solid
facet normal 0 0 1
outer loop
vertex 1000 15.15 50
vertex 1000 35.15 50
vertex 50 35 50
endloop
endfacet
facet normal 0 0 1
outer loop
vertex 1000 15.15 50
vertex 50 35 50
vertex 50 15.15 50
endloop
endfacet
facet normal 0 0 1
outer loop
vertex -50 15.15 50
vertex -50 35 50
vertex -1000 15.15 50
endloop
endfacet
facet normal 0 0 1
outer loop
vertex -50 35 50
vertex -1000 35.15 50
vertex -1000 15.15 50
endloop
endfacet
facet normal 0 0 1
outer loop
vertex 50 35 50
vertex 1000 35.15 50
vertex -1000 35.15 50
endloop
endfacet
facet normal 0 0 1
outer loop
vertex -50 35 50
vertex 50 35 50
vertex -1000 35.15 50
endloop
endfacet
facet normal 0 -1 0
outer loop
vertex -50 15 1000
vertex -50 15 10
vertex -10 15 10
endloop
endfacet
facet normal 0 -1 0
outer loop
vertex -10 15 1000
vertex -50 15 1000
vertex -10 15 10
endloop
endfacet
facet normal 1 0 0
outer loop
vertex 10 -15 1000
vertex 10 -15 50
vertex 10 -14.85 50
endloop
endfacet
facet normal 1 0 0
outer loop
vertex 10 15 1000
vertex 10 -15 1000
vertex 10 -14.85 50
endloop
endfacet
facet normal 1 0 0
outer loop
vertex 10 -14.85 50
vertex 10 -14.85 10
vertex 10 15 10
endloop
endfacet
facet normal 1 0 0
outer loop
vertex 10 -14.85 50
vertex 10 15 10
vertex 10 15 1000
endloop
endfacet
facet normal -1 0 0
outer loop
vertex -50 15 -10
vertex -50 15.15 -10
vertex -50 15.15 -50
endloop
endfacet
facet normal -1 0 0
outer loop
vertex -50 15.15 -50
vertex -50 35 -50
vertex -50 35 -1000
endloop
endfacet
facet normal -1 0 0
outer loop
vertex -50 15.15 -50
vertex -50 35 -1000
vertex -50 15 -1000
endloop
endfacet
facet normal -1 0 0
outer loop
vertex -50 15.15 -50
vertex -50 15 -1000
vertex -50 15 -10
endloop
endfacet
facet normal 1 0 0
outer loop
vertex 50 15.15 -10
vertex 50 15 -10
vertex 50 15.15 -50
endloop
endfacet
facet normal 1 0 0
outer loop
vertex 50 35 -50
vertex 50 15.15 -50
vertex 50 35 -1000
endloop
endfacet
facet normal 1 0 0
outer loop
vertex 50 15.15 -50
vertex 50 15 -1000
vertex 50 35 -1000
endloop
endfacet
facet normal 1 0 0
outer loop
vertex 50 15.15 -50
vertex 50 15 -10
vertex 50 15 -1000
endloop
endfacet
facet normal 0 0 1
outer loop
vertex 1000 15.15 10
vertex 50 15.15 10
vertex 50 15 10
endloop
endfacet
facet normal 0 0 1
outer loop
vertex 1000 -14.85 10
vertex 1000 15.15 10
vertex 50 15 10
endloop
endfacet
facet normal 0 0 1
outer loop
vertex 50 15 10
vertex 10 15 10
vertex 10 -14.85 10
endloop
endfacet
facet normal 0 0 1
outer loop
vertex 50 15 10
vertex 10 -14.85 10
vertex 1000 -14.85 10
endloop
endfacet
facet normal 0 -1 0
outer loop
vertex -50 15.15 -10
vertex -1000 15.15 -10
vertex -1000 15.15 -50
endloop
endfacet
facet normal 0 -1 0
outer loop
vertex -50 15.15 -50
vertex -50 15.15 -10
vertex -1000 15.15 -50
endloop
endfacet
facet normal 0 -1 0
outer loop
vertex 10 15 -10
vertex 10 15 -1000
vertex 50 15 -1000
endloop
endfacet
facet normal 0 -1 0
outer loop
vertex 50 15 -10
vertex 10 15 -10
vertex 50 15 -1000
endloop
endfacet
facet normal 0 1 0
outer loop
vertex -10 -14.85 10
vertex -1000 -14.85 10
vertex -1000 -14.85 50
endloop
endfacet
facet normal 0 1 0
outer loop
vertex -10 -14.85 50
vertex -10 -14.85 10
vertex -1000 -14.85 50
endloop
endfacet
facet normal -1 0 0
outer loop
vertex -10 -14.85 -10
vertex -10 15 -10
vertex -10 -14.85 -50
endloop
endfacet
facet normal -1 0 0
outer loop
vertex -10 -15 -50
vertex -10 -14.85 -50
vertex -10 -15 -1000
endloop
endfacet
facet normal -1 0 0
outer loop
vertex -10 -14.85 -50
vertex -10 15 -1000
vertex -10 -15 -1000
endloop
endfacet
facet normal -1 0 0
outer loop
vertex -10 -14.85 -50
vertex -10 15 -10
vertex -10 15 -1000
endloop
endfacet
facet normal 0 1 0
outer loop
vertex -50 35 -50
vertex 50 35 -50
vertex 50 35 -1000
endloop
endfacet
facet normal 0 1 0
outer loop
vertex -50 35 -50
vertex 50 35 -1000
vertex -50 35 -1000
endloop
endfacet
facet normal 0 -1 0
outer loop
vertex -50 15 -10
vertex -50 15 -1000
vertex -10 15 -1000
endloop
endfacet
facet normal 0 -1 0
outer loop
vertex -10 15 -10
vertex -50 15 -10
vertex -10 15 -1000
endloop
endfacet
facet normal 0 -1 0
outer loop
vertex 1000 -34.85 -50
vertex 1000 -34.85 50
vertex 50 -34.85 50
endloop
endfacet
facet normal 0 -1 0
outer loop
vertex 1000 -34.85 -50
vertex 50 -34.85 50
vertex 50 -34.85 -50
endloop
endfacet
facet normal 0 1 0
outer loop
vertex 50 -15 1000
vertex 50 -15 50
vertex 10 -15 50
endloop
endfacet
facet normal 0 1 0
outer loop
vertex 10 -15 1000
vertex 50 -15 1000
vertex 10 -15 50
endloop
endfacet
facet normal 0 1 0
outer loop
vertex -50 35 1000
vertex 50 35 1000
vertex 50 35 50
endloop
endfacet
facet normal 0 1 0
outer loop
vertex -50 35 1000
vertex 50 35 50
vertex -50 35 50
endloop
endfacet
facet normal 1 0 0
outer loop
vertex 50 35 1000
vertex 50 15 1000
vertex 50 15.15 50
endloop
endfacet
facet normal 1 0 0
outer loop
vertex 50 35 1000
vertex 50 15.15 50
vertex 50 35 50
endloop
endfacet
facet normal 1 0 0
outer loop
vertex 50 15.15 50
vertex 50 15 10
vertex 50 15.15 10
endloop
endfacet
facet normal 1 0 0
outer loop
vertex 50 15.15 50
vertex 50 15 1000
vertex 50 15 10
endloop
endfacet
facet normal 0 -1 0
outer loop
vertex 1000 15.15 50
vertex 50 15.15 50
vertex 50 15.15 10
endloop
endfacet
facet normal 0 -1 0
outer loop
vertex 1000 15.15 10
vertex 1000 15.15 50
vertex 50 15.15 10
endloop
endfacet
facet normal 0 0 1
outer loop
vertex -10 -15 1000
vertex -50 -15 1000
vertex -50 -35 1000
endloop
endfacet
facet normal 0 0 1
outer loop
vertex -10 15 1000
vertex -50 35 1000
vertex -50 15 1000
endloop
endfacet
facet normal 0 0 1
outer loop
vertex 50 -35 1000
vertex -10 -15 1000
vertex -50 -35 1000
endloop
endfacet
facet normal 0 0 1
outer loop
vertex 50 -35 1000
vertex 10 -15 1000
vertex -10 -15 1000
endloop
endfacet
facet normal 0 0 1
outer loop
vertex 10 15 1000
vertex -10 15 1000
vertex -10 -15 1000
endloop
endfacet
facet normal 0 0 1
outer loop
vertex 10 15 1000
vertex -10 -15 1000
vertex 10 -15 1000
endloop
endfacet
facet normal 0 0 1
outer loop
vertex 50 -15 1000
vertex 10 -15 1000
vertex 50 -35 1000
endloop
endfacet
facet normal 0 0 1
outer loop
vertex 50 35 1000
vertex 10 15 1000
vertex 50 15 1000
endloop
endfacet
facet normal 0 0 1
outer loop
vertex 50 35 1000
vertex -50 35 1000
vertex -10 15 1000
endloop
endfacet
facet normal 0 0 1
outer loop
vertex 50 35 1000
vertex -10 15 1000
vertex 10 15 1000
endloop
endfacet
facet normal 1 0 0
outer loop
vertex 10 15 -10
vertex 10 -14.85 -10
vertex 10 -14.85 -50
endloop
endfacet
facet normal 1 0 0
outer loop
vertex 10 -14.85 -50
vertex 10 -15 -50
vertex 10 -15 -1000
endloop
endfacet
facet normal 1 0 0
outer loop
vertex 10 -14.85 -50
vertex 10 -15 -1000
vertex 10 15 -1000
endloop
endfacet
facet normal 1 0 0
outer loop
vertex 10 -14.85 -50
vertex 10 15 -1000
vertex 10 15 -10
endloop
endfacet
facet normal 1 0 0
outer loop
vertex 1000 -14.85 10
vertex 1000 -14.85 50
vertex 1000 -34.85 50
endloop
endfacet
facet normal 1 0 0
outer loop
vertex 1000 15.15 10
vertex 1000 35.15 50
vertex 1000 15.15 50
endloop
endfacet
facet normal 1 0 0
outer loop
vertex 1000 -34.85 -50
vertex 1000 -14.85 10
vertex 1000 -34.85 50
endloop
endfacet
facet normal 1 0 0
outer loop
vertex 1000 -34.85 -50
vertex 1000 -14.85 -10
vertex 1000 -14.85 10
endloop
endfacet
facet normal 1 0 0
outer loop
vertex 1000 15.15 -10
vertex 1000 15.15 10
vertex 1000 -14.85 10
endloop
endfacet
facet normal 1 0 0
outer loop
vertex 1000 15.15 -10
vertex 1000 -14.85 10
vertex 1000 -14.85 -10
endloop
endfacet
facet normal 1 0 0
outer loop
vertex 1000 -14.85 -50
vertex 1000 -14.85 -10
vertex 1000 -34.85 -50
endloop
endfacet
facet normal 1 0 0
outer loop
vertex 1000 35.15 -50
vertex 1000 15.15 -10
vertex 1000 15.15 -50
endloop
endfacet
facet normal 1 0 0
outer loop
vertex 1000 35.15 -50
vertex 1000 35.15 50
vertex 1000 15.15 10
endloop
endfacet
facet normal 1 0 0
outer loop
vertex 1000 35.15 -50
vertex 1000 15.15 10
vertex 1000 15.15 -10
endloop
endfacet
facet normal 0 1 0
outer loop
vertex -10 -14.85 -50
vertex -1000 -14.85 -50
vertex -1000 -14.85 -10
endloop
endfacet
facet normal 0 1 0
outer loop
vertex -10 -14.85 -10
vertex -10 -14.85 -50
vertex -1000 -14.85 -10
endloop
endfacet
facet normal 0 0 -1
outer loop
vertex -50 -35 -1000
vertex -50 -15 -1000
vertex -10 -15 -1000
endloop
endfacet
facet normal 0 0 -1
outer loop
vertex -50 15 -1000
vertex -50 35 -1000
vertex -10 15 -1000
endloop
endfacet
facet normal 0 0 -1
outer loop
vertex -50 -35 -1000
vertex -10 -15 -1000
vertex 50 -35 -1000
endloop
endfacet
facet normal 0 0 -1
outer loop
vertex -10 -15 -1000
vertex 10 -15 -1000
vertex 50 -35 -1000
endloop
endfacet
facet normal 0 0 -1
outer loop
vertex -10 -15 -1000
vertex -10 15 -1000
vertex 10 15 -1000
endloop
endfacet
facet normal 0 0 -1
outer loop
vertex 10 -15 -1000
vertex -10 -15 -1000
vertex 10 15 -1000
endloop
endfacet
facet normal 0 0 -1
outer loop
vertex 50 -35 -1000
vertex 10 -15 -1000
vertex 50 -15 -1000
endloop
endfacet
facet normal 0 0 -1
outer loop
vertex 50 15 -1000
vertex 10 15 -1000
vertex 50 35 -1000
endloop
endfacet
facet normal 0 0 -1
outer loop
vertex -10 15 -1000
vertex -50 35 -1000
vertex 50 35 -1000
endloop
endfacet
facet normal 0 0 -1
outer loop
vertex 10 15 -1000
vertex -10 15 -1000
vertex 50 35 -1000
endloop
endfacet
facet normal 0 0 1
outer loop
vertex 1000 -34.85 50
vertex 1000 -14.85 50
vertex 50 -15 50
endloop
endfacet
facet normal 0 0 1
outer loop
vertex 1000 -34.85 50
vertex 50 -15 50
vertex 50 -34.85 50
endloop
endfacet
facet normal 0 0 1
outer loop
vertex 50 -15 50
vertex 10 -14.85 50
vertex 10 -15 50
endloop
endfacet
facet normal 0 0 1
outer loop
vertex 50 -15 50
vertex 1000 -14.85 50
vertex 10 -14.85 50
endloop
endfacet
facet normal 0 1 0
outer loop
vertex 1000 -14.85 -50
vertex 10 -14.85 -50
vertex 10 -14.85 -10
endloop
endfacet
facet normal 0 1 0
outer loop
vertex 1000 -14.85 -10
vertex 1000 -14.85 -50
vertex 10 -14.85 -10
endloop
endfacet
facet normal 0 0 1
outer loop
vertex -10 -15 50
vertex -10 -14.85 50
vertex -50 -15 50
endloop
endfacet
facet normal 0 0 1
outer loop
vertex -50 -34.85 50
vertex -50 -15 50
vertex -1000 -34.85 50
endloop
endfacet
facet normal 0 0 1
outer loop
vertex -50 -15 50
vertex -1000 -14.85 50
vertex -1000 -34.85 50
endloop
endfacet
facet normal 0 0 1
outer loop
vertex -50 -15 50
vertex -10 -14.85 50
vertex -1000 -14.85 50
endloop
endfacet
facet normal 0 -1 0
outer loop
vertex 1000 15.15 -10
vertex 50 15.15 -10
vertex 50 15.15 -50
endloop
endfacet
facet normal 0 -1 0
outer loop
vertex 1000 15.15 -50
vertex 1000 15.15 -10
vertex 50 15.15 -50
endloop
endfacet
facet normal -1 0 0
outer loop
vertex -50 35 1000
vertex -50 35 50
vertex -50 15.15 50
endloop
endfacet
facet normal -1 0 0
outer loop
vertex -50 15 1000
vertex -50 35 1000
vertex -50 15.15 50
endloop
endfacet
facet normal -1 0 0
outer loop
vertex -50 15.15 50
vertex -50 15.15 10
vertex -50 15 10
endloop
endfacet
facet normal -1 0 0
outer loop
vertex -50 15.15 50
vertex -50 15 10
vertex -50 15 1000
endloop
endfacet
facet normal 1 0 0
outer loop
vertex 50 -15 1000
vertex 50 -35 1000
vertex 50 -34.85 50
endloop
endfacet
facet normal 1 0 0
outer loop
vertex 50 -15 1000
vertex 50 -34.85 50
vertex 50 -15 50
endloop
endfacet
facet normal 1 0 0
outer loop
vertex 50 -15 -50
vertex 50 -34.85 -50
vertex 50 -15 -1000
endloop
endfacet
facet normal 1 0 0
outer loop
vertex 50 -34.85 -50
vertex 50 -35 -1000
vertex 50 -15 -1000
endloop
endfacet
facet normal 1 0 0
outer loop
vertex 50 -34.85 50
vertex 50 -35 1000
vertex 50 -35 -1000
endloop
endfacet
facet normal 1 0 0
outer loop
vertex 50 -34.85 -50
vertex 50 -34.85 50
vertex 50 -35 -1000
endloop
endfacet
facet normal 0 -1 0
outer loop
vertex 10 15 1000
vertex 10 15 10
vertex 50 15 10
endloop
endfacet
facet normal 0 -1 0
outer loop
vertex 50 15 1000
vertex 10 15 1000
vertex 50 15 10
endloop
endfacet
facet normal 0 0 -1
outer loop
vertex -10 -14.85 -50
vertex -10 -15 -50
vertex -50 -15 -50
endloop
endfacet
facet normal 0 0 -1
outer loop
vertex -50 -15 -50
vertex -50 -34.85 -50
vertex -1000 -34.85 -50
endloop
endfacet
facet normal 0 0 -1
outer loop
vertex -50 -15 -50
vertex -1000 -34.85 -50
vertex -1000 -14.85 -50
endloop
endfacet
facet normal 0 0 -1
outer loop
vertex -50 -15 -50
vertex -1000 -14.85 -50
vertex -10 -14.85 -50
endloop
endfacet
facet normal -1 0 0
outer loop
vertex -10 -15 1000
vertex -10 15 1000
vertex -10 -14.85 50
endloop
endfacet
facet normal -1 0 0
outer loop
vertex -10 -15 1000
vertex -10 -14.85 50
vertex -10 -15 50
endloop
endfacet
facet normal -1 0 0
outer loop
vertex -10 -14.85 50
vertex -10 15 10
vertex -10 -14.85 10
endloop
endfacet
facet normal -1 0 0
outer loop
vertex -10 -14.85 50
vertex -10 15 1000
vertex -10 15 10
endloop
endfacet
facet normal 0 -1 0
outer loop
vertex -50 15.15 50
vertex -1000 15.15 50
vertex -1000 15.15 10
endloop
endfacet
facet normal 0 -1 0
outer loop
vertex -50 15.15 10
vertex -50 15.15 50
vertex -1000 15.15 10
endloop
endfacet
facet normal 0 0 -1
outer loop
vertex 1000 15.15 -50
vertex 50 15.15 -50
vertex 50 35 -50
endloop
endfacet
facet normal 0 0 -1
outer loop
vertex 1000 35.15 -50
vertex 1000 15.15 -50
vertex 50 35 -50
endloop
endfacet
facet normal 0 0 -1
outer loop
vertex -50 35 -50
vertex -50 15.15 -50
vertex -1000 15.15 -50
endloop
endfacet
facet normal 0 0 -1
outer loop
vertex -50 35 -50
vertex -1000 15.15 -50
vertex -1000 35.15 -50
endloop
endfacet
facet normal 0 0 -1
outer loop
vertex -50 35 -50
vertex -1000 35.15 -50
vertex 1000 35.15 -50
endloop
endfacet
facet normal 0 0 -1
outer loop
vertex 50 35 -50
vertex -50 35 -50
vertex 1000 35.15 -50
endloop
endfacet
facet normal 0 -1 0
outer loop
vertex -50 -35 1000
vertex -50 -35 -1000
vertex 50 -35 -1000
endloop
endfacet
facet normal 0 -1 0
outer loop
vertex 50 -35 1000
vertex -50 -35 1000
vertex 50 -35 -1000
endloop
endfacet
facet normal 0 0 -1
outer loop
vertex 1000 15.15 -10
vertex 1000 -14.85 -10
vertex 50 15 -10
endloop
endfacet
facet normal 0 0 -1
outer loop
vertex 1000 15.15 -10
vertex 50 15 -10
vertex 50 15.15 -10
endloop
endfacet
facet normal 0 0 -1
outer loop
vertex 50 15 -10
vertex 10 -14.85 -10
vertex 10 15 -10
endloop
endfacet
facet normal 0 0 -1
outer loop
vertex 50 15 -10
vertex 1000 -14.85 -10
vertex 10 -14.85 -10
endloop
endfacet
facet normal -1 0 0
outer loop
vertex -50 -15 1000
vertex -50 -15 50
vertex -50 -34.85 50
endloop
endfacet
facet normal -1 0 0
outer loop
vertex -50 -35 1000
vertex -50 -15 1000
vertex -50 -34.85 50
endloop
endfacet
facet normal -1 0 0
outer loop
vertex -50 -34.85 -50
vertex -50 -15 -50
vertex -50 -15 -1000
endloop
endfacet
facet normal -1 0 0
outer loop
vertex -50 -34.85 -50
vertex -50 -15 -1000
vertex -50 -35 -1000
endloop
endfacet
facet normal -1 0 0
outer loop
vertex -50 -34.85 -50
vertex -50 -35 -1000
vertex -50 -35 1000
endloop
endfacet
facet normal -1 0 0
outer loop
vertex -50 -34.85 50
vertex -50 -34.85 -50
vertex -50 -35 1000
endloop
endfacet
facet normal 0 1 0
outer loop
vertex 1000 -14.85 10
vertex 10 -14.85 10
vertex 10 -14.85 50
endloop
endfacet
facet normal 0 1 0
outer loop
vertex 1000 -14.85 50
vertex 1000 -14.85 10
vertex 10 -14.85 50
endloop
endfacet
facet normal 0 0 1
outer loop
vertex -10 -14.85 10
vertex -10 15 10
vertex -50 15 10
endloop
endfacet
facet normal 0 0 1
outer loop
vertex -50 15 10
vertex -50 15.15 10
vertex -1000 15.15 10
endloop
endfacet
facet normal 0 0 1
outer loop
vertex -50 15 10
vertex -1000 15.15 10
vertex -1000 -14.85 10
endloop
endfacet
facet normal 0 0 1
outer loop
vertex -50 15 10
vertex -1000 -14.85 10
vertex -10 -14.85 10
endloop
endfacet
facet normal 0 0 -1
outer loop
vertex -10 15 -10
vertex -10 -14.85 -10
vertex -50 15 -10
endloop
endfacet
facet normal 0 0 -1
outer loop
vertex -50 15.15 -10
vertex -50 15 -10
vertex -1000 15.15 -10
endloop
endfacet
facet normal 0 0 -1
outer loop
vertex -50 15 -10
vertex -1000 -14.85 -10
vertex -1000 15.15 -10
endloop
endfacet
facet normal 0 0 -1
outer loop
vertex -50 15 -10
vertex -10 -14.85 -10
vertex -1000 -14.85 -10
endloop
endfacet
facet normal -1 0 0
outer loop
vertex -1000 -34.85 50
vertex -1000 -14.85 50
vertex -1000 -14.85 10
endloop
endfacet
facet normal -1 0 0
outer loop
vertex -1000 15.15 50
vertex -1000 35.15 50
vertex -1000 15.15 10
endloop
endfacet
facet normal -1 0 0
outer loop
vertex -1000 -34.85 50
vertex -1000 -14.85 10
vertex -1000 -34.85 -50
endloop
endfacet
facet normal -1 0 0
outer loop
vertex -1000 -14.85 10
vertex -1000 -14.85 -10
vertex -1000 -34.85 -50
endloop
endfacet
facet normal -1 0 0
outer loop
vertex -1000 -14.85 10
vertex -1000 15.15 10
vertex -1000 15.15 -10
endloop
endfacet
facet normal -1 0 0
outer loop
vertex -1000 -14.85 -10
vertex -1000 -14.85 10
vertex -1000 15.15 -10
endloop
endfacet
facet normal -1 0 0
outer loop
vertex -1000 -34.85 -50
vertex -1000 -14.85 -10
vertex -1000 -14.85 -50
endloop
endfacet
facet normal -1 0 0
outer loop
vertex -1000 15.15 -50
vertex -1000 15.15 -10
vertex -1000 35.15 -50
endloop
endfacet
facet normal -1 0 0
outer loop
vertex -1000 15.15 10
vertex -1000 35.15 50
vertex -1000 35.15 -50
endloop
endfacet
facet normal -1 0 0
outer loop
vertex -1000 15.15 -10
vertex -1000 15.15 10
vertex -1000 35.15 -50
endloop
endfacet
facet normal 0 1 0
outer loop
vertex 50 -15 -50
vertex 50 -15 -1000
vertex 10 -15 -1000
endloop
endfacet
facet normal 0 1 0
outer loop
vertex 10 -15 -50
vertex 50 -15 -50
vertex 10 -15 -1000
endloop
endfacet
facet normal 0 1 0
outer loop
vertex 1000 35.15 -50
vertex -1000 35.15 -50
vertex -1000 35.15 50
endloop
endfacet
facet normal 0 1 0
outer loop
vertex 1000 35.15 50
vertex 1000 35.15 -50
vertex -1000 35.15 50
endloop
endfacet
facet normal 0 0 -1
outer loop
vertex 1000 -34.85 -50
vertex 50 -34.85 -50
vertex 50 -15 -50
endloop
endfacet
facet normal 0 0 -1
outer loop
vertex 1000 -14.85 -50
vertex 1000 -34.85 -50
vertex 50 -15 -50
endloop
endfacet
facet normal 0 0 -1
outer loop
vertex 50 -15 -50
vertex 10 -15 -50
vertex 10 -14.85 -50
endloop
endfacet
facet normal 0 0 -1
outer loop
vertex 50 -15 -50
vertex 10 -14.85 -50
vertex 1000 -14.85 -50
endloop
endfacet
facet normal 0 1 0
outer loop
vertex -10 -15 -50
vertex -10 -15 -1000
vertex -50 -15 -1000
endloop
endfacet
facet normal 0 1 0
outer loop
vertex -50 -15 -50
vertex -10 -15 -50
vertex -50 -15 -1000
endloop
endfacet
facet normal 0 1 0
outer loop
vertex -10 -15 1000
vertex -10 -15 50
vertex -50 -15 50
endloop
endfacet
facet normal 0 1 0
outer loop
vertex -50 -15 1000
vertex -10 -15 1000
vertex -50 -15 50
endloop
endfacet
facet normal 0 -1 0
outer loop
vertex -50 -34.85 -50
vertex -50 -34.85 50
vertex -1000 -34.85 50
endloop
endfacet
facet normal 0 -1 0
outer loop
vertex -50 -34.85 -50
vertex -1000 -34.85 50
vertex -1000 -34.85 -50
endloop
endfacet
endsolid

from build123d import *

# Parameters (mm, degrees)
BOSS_EXTRUDE1_DEPTH      = 1000
BOSS_EXTRUDE1_DEPTH_BACK = 1000
BOSS_EXTRUDE2_DEPTH      = 1000
BOSS_EXTRUDE2_DEPTH_BACK = 1000


with BuildPart() as part:
    # Sketch1 → Boss-Extrude1 (new, two sides: drawn at the far end of the back side and taken through both)
    with BuildSketch(Plane.XY.offset(-BOSS_EXTRUDE1_DEPTH_BACK)):
        Polygon((10, 15), (50, 15), (50, 35), (-50, 35), (-50, 15), (-10, 15), (-10, -15), (-50, -15), (-50, -35), (50, -35), (50, -15), (10, -15), align=None)
    extrude(amount=BOSS_EXTRUDE1_DEPTH + BOSS_EXTRUDE1_DEPTH_BACK)

    # Sketch2 → Boss-Extrude2 (add, two sides: drawn at the far end of the back side and taken through both)
    with BuildSketch(Plane(origin=(0, 0, 0), x_dir=(0, 0, -1), z_dir=(1, 0, 0)).offset(-BOSS_EXTRUDE2_DEPTH_BACK)):
        Polygon((10, 15.14982009), (50, 15.14982009), (50, 35.14982009), (-50, 35.14982009), (-50, 15.14982009), (-10, 15.14982009), (-10, -14.85017991), (-50, -14.85017991), (-50.000001017, -34.85017991), (49.999998983, -34.85017991), (50, -14.85017991), (10, -14.85017991), align=None)
    extrude(amount=BOSS_EXTRUDE2_DEPTH + BOSS_EXTRUDE2_DEPTH_BACK)


solid = part.part
